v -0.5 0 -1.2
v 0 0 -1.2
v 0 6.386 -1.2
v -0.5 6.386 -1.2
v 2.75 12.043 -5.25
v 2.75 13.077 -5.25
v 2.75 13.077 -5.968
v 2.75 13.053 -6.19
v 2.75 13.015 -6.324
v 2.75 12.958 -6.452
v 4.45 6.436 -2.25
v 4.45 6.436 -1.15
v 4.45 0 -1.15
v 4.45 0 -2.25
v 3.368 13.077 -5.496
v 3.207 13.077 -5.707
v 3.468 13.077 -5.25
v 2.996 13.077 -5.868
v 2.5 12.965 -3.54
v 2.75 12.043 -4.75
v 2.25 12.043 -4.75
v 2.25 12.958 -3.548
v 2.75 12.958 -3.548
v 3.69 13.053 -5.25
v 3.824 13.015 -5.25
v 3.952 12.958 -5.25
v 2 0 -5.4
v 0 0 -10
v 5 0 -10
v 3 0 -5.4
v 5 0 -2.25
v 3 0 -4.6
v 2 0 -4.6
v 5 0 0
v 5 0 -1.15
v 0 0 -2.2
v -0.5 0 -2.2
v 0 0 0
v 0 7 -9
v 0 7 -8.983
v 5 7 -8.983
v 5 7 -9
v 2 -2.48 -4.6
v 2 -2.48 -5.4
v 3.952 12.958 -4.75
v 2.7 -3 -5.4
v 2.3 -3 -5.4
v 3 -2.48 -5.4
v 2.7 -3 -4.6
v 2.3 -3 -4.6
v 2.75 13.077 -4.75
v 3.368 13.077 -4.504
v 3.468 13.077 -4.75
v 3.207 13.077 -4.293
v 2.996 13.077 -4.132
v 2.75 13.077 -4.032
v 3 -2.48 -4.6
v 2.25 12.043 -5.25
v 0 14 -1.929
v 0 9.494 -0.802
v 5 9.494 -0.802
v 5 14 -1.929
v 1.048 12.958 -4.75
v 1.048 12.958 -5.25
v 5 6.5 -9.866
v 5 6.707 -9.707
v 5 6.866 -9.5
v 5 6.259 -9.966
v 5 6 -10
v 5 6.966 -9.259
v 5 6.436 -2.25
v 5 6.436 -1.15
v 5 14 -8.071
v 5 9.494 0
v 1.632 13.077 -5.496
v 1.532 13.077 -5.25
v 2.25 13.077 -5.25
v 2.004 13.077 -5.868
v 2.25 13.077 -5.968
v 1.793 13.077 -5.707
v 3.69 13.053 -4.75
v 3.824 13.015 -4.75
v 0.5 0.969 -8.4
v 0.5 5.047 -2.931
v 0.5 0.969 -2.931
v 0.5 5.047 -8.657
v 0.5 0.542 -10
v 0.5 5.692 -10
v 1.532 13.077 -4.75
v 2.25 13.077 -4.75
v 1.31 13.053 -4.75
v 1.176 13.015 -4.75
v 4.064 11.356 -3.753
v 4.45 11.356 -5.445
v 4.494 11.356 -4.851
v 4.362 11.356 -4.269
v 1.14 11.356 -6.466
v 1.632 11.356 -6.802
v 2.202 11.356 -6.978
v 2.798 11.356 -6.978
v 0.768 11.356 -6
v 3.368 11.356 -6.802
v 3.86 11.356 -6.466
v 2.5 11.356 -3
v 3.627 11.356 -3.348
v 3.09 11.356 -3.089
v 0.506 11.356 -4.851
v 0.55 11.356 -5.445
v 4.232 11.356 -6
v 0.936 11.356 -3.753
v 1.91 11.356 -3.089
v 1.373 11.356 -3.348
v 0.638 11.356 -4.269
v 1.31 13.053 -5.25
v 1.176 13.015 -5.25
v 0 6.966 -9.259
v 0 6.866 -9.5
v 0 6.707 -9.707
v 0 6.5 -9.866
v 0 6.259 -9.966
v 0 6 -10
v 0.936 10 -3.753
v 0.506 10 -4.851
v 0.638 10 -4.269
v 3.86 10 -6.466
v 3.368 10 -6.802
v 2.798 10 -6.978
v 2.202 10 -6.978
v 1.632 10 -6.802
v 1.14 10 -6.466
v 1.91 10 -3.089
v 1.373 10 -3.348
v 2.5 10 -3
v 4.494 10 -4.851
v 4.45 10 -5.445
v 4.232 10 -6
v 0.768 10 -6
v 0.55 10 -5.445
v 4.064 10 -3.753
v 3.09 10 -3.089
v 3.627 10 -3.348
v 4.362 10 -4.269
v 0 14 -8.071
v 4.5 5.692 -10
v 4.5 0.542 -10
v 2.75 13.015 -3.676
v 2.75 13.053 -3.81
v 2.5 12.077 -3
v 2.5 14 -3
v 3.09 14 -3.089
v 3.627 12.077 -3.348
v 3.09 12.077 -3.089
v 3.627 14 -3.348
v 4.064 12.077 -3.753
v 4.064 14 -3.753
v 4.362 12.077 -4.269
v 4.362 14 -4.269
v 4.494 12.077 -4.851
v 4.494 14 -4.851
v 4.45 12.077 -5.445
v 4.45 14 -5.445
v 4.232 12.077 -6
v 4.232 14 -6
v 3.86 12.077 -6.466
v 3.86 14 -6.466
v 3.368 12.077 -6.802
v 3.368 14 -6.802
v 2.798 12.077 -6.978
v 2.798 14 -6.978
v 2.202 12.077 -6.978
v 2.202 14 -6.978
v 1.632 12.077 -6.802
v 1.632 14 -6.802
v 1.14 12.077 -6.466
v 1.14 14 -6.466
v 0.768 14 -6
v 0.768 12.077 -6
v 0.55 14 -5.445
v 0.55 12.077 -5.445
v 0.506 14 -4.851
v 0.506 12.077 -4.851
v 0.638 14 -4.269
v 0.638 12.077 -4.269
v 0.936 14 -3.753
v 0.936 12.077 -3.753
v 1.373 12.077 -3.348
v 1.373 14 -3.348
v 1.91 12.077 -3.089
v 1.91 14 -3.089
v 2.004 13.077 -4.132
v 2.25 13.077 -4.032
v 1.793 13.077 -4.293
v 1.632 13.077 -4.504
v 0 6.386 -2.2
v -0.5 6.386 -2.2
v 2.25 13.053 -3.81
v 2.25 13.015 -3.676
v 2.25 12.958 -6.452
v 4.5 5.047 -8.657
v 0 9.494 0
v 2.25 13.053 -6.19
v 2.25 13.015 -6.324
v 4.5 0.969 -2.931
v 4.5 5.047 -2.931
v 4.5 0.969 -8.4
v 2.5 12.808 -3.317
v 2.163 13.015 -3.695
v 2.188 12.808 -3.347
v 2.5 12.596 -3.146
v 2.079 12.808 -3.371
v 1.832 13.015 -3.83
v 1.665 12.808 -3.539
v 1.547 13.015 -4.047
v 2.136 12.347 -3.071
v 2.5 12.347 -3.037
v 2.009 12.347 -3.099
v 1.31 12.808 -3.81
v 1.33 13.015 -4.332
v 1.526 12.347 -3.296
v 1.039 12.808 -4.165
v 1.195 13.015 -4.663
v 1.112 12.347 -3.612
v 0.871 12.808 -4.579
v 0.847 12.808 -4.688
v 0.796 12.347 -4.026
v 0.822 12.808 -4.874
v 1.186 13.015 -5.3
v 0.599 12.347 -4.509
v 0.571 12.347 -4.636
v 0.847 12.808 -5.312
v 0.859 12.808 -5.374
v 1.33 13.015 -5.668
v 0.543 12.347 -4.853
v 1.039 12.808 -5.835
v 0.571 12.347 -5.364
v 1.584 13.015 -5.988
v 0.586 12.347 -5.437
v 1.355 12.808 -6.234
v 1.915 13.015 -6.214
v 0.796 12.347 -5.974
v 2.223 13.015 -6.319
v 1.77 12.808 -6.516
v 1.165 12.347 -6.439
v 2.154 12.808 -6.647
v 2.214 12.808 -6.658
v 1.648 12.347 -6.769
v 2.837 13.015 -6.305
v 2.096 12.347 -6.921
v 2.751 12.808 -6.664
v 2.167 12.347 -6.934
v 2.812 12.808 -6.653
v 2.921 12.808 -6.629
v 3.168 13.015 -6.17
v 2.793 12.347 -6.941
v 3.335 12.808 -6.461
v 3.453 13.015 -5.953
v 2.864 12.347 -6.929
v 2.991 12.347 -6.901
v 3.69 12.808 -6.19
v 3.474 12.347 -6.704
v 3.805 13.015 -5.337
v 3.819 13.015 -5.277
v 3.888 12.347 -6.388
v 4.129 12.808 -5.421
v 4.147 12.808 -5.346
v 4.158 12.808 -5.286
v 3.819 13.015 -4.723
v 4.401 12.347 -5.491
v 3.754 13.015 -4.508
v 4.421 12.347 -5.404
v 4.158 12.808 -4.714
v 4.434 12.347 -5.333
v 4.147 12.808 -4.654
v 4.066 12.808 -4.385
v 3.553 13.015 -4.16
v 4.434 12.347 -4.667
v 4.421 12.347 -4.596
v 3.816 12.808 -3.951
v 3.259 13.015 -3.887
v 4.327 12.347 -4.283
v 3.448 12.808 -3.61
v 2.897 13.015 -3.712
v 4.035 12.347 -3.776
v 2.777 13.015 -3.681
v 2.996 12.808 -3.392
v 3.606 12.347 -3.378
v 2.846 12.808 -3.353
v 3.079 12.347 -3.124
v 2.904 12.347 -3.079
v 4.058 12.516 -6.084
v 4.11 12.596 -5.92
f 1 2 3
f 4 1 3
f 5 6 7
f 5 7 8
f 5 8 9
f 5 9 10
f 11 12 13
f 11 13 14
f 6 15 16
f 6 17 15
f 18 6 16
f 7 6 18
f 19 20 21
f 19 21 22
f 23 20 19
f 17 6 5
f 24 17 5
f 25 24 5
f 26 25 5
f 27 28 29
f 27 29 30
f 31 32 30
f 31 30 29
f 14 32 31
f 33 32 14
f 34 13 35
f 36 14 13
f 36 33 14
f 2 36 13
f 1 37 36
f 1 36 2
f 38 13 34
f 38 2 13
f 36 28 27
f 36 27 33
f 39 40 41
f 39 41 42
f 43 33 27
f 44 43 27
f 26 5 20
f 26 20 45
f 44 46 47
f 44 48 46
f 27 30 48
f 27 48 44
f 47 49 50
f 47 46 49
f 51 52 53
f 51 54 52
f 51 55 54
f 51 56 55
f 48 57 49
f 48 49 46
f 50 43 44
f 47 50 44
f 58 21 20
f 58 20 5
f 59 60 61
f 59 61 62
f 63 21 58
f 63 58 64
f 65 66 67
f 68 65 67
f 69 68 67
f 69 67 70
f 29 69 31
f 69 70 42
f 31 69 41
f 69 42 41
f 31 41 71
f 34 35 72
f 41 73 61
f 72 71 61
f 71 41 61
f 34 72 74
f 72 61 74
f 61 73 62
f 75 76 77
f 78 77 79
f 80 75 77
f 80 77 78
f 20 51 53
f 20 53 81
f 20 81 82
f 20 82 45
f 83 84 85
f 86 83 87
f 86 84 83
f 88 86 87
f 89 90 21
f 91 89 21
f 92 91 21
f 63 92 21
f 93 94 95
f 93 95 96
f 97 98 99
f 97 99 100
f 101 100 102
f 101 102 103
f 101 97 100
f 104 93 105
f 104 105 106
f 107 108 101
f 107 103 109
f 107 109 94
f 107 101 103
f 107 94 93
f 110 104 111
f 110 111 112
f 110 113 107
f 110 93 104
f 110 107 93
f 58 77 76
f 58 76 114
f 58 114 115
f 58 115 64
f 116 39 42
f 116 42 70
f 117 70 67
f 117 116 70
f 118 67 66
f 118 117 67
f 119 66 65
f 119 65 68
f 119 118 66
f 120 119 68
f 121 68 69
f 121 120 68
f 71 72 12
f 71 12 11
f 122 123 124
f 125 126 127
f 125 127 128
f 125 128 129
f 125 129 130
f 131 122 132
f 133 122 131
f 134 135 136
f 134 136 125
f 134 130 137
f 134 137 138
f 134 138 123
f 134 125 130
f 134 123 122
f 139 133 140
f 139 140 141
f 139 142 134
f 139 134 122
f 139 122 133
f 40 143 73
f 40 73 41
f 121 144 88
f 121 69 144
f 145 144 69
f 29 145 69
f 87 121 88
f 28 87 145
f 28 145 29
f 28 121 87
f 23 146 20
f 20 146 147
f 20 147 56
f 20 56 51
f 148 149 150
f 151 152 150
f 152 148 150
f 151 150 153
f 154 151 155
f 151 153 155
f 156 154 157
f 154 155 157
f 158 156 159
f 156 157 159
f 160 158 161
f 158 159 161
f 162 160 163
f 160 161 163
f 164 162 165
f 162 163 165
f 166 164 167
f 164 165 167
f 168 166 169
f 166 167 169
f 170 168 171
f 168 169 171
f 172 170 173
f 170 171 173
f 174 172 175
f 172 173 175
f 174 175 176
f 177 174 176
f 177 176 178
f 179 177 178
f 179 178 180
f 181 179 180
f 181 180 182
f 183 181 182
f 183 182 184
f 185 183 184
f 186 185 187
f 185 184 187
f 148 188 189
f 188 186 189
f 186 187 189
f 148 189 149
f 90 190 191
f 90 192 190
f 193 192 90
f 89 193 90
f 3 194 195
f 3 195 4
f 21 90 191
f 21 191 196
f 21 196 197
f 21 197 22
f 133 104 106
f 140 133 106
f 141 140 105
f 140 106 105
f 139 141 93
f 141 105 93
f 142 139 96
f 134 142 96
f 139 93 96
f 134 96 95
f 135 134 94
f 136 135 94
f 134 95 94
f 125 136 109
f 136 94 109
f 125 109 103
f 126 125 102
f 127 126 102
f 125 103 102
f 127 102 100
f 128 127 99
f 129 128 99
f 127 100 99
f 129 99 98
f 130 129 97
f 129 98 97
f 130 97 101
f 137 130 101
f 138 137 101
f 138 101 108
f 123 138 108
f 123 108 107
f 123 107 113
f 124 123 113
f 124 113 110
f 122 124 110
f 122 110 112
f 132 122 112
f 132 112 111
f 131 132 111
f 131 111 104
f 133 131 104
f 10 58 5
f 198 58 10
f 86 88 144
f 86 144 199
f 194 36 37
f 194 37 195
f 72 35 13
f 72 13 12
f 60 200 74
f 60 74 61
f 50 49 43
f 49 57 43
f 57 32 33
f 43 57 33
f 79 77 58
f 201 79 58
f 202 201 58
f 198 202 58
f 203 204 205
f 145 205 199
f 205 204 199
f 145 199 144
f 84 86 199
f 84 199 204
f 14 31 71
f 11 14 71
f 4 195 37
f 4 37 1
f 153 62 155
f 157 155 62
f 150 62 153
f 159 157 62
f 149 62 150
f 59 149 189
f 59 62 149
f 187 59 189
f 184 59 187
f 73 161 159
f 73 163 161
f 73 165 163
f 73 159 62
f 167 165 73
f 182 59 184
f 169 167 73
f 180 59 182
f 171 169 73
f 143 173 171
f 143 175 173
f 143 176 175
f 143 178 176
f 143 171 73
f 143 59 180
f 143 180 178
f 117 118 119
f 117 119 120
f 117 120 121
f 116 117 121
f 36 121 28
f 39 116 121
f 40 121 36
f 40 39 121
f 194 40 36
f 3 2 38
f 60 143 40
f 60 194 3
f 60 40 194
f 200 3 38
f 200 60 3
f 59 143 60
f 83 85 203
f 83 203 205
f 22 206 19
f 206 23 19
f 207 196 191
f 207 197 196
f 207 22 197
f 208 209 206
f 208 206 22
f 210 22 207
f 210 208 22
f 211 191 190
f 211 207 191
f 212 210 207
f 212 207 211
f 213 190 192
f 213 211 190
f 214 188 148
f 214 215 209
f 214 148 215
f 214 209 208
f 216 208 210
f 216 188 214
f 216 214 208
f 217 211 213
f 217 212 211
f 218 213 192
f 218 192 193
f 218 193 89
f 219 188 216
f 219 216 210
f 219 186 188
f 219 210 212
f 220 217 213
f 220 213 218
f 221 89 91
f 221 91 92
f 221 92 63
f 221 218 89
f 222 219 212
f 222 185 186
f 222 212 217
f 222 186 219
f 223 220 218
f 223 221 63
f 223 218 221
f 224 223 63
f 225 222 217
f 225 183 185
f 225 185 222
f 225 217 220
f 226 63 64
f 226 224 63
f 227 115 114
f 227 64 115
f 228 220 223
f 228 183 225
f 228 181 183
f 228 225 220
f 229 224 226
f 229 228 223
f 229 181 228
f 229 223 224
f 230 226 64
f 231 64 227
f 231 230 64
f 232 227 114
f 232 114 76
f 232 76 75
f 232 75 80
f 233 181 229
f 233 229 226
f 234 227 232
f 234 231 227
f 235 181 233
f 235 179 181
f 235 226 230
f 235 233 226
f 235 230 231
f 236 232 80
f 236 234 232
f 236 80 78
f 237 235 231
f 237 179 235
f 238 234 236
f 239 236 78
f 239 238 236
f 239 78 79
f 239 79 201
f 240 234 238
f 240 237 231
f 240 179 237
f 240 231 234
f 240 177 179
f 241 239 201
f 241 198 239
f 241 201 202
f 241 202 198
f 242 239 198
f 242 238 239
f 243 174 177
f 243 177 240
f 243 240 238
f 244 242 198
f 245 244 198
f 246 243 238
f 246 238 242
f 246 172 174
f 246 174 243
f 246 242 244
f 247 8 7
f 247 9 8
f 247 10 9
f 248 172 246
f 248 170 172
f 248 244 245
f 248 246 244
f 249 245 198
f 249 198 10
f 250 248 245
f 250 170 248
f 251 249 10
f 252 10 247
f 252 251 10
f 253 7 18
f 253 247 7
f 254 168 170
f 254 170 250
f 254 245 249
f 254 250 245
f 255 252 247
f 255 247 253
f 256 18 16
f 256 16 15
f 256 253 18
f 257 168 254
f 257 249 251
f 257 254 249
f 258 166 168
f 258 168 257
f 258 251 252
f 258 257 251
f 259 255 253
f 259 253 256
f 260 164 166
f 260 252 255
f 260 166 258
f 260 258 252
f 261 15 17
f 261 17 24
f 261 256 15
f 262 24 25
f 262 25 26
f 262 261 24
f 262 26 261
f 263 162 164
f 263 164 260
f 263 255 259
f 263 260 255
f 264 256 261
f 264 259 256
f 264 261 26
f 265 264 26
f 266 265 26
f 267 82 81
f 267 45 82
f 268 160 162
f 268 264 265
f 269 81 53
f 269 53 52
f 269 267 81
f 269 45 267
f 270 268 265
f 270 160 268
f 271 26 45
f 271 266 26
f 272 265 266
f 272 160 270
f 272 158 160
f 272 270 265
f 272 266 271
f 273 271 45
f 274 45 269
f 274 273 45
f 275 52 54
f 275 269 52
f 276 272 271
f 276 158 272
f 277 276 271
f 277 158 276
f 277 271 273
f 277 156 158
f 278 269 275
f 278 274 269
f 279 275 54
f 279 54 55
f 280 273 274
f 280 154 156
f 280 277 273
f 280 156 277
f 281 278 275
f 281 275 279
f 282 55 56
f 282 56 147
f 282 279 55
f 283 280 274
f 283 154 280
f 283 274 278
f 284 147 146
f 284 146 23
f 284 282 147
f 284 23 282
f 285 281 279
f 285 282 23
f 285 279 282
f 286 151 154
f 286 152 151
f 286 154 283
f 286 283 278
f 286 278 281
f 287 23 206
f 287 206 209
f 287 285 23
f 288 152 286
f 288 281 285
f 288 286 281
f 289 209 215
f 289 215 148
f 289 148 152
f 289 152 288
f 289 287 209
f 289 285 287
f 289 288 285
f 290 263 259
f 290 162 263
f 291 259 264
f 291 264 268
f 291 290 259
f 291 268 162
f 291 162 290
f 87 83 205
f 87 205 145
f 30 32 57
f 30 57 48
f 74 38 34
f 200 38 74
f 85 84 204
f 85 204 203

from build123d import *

# Parameters (mm, degrees)
BOSS_EXTRUDE1_DEPTH      = 5
CUT_EXTRUDE_1_DEPTH      = 4
SKETCH_4_R               = 2
CUT_EXTRUDE_2_DEPTH      = 4
CUT_EXTRUDE_START        = 0.25
CUT_EXTRUDE_3_DEPTH      = 0.5
PATTERN_CIRCULAR_2_COUNT = 4
SKETCH_7_W               = 1
SKETCH_7_H               = 6.38564687
EXTRUDE_1_DEPTH          = 0.5
SKETCH_8_W               = 1.1
SKETCH_8_H               = 6.43564687
CUT_EXTRUDE_4_DEPTH      = 0.55
SKETCH_10_W              = 1
SKETCH_10_H              = 0.8
EXTRUDE_2_DEPTH          = 3
CHAMFER_2_SIZE           = 0.3
CHAMFER_2_SIZE2          = 0.519615242
CHAMFER_3_SIZE           = 0.3
CHAMFER_3_SIZE2          = 0.519615242


with BuildPart() as part:
    # Sketch1 → Boss-Extrude1 (new body)
    with BuildSketch(Plane(origin=(0, 0, 0), x_dir=(0, 0, -1), z_dir=(1, 0, 0))):
        with BuildLine():
            Line((8.071293529, 14), (8.983255455, 7))
            Line((8.983255455, 7), (9, 7))
            ThreePointArc((9, 7), (9.707106781, 6.707106781), (10, 6))
            Line((10, 6), (10, 0))
            Line((10, 0), (0, 0))
            Line((0, 0), (0, 9.493570114))
            Line((0, 9.493570114), (0.802161187, 9.493570114))
            Line((0.802161187, 9.493570114), (1.928706471, 14))
            Line((1.928706471, 14), (8.071293529, 14))
        make_face()
    extrude(amount=BOSS_EXTRUDE1_DEPTH)

    # Эскиз2 → Вырез-Вытянуть1 (cut)
    with BuildSketch(Plane.ZY.offset(-0.5)):
        Polygon((-10, 5.692040605), (-8.656873738, 5.046895275), (-2.931105615, 5.046895275), (-2.931105615, 0.968562632), (-8.400228705, 0.968562632), (-10, 0.542354651), align=None)
    extrude(amount=-CUT_EXTRUDE_1_DEPTH, mode=Mode.SUBTRACT)

    # Эскиз4 → Вырез-Вытянуть2 (cut)
    with BuildSketch(Plane(origin=(0, 14, 0), x_dir=(1, 0, 0), z_dir=(0, 1, 0))):
        with Locations((2.5, 5)):
            Circle(SKETCH_4_R)
    extrude(amount=-CUT_EXTRUDE_2_DEPTH, mode=Mode.SUBTRACT)

    # Эскиз5 → Повернуть1 (revolve)
    with BuildSketch(Plane.ZY.offset(-2.5)):
        with BuildLine():
            Line((-5, 13.076817247), (-6, 13.076817247))
            ThreePointArc((-6, 13.076817247), (-6.707106781, 12.783924028), (-7, 12.076817247))
            Line((-7, 12.076817247), (-7, 11.356355107))
            Line((-7, 11.356355107), (-5, 11.356355107))
            Line((-5, 11.356355107), (-5, 13.076817247))
        make_face()
    revolve(axis=Axis((2.5, 13.076817247, -5), (0, -1, 0)))

    # Эскиз6 → Вырез-Вытянуть3 (cut)
    with BuildSketch(Plane.ZY.offset(-2.5).offset(CUT_EXTRUDE_START)):
        Polygon((-6.758727889, 13.191820369), (-5, 13.191820369), (-5, 12.042931868), (-5.25, 12.042931868), align=None)
    cut_extrude_3 = extrude(amount=-CUT_EXTRUDE_3_DEPTH, mode=Mode.SUBTRACT)

    # Круговой массив2: Вырез-Вытянуть3 ×4 about axis
    pattern_circular_2_axis = Axis((2.5, -0.7, -5), (0, 1, 0))
    for i in range(1, PATTERN_CIRCULAR_2_COUNT):
        add(cut_extrude_3.rotate(pattern_circular_2_axis, i * 360 / PATTERN_CIRCULAR_2_COUNT), mode=Mode.SUBTRACT)

    # Эскиз7 → Бобышка-Вытянуть1 (add)
    with BuildSketch(Plane.ZY):
        with Locations((-1.7, 3.192823435)):
            Rectangle(SKETCH_7_W, SKETCH_7_H)
    extrude(amount=EXTRUDE_1_DEPTH)

    # Эскиз8 → Вырез-Вытянуть4 (cut)
    with BuildSketch(Plane(origin=(5, 0, 0), x_dir=(0, 0, -1), z_dir=(1, 0, 0))):
        with Locations((1.7, 3.217823435)):
            Rectangle(SKETCH_8_W, SKETCH_8_H)
    extrude(amount=-CUT_EXTRUDE_4_DEPTH, mode=Mode.SUBTRACT)

    # Эскиз10 → Бобышка-Вытянуть2 (add)
    with BuildSketch(Plane(origin=(0, 0, 0), x_dir=(-1, 0, 0), z_dir=(0, -1, 0))):
        with Locations((-2.5, 5)):
            Rectangle(SKETCH_10_W, SKETCH_10_H)
    extrude(amount=EXTRUDE_2_DEPTH)

    # Фаска2
    chamfer_2_edges = [part.edges().sort_by_distance(p)[0] for p in [
        (2, -3, -5),
    ]]
    chamfer_2_side = [part.faces().sort_by_distance(p)[0] for p in [
        (2.5, -3, -5),
    ]]
    chamfer(chamfer_2_edges, length=CHAMFER_2_SIZE, length2=CHAMFER_2_SIZE2, reference=chamfer_2_side[0])

    # Фаска3
    chamfer_3_edges = [part.edges().sort_by_distance(p)[0] for p in [
        (3, -3, -5),
    ]]
    chamfer_3_side = [part.faces().sort_by_distance(p)[0] for p in [
        (2.65, -3, -5),
    ]]
    chamfer(chamfer_3_edges, length=CHAMFER_3_SIZE, length2=CHAMFER_3_SIZE2, reference=chamfer_3_side[0])


solid = part.part
